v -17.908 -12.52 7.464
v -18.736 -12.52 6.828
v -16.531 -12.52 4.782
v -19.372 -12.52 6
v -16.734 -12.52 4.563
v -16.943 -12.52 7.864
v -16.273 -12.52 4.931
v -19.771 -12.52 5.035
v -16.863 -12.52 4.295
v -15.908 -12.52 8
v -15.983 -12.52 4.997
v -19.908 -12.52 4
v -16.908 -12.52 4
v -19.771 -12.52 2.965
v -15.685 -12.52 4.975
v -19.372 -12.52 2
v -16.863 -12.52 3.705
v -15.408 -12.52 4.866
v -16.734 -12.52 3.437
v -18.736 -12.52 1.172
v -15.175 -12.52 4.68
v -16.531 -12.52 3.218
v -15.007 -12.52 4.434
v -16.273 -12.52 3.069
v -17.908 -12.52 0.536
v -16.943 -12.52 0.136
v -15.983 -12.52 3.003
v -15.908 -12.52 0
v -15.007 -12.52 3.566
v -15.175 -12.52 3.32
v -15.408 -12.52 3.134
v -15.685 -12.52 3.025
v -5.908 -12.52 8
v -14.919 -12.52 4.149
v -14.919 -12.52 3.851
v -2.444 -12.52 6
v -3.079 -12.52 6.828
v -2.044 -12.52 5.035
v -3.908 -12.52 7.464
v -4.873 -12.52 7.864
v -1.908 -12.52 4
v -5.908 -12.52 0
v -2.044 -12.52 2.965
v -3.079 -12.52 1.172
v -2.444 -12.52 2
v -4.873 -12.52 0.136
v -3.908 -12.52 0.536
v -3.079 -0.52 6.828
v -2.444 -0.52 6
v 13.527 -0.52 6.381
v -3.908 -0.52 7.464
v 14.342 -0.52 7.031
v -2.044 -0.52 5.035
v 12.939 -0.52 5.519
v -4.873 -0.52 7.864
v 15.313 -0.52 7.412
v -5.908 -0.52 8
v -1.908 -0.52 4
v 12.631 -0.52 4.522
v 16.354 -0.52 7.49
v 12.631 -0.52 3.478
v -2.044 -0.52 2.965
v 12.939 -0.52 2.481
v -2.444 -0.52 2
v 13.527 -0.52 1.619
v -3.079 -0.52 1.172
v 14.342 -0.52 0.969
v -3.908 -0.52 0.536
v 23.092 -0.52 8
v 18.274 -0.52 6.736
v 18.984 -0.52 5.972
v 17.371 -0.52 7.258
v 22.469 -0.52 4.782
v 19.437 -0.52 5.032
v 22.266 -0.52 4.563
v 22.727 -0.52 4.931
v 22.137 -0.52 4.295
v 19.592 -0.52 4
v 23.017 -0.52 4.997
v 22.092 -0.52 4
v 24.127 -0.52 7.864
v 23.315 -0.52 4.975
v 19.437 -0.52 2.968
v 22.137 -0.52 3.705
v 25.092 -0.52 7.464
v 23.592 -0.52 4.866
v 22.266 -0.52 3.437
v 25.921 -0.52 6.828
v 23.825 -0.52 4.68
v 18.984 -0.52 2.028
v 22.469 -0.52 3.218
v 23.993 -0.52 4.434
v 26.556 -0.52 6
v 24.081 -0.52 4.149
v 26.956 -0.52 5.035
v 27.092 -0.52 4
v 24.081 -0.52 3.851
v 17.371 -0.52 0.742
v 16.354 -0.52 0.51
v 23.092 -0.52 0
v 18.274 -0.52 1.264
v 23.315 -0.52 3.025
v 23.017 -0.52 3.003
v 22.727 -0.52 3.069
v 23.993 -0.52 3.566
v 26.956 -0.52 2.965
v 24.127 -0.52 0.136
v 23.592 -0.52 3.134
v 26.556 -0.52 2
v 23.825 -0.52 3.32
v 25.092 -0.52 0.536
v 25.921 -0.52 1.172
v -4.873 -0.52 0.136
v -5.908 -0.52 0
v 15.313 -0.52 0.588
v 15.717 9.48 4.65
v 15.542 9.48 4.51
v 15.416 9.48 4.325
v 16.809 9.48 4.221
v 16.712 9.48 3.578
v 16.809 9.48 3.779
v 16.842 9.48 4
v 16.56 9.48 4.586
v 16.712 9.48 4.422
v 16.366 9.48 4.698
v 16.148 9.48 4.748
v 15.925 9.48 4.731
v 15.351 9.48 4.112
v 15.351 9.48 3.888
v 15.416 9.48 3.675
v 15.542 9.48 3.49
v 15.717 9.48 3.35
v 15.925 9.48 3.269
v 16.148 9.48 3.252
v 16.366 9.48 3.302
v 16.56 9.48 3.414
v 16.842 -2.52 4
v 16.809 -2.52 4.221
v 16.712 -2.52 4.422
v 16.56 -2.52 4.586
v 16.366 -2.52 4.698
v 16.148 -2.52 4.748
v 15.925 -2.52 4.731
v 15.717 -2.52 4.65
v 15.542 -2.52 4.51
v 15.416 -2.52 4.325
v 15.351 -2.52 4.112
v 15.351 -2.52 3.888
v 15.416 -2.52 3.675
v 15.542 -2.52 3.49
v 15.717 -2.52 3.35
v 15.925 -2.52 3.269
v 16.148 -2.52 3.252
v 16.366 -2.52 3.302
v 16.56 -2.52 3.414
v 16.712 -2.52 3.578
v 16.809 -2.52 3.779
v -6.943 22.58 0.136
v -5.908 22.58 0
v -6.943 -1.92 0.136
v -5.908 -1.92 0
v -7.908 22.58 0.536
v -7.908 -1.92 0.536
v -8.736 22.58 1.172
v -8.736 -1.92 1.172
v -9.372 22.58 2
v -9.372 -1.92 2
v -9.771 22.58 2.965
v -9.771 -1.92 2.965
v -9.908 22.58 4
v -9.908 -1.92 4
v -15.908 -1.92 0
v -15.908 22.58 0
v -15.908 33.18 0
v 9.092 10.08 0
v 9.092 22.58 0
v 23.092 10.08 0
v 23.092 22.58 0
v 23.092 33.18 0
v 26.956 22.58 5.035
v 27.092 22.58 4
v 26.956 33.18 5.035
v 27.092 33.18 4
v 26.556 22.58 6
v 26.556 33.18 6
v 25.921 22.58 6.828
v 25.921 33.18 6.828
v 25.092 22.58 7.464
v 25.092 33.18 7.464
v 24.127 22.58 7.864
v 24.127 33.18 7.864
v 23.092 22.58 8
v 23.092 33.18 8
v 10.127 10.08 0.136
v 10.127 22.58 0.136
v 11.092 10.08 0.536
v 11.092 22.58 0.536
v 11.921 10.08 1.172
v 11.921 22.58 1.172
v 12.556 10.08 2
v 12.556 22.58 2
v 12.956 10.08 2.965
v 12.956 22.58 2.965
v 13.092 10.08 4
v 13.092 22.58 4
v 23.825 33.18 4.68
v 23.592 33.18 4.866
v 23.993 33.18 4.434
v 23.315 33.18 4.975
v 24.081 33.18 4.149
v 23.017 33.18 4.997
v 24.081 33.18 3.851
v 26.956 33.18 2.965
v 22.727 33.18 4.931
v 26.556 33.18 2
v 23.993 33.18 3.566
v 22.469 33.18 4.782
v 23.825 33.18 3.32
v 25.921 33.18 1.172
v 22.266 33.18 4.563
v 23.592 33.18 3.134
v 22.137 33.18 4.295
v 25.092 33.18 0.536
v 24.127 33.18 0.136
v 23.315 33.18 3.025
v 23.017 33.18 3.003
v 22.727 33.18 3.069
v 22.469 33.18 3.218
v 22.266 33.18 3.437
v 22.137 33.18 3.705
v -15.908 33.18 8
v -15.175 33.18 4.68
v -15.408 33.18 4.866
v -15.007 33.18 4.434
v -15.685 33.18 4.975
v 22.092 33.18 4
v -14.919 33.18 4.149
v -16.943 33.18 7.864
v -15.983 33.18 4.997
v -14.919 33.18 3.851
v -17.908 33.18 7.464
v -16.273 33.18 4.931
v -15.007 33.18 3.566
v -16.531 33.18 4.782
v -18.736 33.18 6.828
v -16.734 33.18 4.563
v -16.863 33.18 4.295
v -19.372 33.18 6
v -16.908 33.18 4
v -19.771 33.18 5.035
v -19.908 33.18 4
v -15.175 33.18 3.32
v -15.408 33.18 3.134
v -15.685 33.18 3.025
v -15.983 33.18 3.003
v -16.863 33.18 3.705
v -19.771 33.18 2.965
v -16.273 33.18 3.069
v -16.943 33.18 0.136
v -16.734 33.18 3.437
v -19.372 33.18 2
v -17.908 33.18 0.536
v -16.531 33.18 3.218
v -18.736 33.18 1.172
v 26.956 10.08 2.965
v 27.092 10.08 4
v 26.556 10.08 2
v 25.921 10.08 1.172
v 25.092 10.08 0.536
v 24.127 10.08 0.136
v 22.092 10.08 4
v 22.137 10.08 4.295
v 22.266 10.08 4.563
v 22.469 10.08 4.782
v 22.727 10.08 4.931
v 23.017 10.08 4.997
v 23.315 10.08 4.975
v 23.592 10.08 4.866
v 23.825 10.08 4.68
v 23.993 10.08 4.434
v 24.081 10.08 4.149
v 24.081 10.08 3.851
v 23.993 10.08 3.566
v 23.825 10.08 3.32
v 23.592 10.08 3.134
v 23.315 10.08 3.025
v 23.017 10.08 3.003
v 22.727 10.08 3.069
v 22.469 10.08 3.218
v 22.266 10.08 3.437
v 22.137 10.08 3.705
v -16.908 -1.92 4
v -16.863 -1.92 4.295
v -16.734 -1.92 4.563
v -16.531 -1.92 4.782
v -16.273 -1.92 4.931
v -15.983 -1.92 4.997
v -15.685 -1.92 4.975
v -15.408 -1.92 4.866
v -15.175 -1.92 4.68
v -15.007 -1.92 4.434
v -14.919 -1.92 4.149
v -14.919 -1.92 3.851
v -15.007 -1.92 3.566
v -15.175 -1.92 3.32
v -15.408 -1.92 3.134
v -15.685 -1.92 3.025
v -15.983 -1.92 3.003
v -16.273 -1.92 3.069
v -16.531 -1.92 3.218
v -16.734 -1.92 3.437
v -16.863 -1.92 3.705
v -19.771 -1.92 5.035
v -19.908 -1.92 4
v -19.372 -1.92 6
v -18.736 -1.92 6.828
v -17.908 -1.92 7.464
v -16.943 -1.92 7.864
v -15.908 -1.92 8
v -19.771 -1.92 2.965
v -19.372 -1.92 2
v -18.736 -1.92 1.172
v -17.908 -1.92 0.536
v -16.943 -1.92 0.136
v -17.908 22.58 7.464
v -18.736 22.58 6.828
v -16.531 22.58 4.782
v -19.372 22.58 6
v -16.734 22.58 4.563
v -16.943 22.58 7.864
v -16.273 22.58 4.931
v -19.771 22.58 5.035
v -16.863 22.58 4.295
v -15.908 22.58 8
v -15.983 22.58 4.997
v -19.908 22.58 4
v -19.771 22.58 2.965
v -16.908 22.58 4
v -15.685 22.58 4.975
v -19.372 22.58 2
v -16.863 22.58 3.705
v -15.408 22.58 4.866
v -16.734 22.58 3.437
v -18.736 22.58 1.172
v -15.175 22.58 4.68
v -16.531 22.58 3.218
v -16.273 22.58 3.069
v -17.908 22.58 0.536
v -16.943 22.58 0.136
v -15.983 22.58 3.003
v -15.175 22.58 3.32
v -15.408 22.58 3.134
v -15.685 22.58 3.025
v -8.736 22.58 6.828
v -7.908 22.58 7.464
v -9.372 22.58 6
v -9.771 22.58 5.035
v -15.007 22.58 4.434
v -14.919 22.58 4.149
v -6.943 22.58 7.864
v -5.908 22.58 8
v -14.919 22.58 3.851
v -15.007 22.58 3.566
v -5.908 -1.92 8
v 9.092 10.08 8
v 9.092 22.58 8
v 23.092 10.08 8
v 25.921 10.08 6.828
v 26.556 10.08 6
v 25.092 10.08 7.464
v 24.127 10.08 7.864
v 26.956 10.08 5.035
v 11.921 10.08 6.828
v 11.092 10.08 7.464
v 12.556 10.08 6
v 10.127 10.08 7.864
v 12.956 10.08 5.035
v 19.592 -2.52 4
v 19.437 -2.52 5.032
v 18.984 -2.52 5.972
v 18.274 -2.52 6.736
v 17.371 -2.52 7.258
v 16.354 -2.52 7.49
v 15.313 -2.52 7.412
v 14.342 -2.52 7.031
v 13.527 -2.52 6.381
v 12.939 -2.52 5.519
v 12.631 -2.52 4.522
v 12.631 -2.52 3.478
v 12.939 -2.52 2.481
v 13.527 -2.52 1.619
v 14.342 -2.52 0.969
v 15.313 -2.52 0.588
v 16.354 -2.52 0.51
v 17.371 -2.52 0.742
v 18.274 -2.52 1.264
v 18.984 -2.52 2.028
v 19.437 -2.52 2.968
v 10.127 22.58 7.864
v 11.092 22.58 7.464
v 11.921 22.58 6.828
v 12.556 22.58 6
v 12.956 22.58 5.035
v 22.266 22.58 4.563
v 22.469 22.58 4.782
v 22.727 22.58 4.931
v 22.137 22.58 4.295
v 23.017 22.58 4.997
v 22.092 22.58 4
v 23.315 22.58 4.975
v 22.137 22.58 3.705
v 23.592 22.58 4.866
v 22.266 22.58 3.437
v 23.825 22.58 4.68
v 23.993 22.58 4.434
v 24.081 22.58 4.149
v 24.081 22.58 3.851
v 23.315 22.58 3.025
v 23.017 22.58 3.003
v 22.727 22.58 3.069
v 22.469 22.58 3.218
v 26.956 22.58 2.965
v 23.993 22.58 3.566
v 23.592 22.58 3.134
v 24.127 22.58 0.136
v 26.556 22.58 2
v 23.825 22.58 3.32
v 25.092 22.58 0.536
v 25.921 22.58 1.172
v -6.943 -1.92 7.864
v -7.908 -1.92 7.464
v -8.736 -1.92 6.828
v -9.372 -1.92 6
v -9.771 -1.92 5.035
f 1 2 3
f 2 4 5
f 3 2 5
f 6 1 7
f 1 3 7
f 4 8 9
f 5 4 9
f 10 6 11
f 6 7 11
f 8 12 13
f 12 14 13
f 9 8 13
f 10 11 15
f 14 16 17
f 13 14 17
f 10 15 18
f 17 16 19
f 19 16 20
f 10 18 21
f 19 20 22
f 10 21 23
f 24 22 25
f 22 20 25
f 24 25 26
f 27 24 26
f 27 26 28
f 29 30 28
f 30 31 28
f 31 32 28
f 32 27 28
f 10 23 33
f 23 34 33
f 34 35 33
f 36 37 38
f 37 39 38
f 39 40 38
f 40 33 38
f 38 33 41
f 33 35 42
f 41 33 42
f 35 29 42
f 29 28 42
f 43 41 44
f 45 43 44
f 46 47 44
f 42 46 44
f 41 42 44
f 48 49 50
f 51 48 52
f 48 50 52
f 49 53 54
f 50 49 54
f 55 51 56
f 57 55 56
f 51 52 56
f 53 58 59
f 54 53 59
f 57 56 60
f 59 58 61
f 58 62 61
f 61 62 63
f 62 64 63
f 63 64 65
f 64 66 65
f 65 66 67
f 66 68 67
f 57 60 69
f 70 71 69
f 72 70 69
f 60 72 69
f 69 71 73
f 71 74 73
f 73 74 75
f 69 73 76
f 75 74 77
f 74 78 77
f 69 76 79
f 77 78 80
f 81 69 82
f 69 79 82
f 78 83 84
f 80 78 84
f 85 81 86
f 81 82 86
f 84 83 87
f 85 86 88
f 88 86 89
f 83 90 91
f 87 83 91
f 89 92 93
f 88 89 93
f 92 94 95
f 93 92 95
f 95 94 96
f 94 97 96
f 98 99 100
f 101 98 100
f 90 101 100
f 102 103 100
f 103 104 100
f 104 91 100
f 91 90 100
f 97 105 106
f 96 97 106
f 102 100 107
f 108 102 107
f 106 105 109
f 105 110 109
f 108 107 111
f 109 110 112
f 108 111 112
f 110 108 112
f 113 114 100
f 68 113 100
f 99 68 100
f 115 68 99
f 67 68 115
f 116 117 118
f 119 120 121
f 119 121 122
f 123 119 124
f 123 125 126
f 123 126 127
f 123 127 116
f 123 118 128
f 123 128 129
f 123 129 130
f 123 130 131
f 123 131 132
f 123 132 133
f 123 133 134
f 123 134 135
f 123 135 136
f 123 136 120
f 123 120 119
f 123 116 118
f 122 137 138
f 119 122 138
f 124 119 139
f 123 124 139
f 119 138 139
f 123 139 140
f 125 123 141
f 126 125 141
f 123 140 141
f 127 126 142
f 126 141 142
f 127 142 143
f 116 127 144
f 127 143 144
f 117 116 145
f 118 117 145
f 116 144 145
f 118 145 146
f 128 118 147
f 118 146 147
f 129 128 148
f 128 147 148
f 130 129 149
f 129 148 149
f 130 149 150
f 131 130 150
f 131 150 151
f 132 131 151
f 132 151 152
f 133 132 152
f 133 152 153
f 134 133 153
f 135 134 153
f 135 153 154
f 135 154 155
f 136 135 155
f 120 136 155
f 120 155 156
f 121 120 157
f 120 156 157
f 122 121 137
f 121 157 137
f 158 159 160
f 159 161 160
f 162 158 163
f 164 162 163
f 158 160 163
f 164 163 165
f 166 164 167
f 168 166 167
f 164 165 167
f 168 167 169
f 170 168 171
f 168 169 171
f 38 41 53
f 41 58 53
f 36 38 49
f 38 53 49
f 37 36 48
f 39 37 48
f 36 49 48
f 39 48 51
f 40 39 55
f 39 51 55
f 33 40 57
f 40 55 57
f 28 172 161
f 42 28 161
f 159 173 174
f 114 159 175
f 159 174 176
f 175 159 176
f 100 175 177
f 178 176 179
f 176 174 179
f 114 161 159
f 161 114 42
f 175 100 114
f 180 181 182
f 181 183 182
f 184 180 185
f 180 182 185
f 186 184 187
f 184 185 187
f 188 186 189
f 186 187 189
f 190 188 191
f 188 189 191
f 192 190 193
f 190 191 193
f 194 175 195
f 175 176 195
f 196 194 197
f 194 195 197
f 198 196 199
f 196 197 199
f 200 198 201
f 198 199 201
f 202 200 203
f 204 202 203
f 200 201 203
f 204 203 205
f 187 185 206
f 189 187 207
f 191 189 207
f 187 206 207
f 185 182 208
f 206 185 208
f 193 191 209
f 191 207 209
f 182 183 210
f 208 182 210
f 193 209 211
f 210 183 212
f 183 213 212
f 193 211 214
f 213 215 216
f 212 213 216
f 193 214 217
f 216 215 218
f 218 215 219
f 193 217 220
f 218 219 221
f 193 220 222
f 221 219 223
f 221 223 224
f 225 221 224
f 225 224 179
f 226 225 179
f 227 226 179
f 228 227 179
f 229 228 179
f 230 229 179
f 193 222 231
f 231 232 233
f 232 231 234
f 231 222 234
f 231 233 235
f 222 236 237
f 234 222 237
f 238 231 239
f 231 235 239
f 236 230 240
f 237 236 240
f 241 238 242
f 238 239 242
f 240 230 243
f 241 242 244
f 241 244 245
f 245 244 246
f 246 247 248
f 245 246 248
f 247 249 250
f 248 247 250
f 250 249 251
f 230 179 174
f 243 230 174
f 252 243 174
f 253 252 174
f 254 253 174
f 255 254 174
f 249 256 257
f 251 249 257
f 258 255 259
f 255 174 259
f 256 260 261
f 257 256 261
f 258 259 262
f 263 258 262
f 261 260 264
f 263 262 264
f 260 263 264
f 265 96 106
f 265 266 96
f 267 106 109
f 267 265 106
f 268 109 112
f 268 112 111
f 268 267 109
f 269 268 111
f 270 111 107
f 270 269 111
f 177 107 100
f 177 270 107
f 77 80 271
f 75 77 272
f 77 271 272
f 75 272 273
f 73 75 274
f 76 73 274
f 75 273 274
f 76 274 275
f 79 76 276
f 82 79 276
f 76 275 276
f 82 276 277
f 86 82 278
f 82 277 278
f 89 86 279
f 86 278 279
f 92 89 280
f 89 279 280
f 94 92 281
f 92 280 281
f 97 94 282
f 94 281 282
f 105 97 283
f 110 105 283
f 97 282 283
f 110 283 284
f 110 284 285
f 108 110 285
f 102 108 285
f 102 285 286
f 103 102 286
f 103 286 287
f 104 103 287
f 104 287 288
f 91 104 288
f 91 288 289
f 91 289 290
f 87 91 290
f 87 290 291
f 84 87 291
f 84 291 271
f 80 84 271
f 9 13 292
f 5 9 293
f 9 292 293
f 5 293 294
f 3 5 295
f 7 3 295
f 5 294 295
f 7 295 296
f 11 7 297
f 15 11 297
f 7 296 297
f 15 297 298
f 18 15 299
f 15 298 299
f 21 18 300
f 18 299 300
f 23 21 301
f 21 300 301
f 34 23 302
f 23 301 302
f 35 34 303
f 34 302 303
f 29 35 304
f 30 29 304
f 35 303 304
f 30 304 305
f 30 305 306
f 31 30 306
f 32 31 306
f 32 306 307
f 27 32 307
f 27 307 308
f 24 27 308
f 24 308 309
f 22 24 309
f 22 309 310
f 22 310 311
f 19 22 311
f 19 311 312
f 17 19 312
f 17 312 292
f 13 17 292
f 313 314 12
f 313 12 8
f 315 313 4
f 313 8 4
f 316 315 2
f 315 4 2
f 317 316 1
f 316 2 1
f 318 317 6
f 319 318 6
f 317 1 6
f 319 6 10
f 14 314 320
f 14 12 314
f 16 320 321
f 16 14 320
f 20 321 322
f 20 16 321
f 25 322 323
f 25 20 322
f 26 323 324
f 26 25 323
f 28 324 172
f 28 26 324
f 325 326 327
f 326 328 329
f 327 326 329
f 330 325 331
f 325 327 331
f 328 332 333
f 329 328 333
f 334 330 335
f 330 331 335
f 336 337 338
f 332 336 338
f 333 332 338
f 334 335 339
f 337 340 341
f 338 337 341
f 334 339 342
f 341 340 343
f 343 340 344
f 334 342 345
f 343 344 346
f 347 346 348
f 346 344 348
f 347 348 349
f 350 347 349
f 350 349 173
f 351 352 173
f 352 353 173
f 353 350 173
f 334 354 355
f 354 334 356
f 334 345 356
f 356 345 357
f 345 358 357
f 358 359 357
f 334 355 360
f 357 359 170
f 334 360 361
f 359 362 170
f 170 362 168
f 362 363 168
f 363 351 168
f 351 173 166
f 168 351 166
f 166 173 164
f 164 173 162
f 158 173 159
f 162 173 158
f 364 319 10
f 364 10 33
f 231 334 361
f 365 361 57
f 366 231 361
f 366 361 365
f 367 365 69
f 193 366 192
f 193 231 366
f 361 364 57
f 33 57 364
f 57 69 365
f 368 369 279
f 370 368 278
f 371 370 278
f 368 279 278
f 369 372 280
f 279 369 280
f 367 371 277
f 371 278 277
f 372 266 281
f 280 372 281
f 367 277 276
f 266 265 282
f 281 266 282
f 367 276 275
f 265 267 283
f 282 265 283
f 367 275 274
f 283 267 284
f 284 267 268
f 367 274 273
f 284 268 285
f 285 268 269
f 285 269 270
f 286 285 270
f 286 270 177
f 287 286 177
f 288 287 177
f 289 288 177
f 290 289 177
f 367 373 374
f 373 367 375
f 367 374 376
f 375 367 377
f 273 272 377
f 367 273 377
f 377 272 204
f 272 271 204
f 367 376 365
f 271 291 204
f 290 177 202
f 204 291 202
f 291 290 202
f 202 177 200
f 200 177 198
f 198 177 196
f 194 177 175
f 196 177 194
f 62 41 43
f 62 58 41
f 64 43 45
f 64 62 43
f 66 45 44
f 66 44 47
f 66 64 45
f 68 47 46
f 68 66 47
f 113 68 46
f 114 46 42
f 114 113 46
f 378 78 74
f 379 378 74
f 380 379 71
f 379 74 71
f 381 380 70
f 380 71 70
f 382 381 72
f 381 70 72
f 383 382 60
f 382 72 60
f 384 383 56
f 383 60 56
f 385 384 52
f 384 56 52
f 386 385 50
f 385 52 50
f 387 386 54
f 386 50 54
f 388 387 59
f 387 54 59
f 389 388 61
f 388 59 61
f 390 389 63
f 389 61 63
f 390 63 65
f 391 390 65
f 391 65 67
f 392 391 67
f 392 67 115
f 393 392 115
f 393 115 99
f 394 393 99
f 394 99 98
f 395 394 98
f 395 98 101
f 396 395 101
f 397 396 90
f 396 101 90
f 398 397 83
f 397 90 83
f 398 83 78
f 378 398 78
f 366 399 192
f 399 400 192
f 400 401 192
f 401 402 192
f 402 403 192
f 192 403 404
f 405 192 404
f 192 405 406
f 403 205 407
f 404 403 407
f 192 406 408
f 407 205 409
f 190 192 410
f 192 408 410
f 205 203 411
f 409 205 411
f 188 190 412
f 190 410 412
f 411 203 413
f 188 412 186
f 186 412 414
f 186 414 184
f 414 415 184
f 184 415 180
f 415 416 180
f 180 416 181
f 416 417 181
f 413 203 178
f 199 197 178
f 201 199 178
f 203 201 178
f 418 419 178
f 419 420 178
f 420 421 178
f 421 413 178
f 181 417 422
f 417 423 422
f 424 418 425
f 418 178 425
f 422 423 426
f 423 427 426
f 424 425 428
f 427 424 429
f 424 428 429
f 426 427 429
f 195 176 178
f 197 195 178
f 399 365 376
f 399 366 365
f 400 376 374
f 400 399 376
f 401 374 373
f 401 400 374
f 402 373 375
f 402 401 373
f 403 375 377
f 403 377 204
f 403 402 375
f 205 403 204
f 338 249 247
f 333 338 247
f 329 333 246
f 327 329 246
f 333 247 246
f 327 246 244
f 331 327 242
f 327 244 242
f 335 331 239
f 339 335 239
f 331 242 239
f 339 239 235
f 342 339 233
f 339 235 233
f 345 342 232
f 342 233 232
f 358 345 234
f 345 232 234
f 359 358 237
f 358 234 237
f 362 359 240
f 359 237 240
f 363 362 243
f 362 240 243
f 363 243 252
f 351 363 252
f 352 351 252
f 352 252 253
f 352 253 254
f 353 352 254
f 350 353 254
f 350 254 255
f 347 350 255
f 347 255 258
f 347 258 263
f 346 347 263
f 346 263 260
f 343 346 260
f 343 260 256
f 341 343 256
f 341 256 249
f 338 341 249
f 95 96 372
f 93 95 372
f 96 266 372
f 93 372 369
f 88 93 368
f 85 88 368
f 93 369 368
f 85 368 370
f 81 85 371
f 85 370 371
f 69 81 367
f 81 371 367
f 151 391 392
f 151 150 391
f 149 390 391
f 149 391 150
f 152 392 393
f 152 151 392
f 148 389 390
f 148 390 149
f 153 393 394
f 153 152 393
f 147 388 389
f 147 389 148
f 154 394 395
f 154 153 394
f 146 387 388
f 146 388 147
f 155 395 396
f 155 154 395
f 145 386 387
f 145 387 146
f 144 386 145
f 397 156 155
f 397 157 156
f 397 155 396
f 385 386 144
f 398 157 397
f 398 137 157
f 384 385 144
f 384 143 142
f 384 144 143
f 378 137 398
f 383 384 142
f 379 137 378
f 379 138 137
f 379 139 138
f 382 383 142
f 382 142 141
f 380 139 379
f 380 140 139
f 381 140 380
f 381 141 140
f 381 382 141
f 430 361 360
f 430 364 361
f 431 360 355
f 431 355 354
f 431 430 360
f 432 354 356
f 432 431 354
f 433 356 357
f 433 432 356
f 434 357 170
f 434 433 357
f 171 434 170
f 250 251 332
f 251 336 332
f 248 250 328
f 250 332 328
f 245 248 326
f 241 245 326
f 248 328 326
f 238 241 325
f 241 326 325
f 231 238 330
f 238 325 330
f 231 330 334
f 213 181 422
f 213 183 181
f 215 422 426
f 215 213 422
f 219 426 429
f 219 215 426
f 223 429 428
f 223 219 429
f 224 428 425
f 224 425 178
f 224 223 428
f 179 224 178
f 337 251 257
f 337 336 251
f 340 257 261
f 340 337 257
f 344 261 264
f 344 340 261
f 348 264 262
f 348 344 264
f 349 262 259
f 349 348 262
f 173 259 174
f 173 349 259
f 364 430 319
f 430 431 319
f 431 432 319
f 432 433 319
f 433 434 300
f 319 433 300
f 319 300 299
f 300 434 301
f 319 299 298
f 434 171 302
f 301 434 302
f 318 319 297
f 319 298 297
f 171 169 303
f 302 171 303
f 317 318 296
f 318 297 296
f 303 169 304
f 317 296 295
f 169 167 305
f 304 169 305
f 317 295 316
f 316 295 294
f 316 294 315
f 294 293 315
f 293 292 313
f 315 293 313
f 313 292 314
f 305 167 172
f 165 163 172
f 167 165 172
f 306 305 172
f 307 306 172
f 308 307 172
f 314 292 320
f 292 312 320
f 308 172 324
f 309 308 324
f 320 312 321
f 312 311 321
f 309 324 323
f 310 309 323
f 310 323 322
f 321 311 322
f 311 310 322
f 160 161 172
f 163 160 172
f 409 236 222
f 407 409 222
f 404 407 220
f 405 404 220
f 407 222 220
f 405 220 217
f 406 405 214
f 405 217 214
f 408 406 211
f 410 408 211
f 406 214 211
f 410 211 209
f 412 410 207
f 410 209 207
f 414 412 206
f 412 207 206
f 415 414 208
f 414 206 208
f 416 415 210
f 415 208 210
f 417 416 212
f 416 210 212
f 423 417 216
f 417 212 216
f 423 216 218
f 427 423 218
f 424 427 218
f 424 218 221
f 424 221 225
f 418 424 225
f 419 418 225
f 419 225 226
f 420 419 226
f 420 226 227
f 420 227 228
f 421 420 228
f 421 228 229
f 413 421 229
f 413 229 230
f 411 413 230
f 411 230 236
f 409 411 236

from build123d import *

# Parameters (mm, degrees)
F1_DEPTH = 8
F2_R     = 3.99999
F3_R     = 1
F4_DEPTH = 60
F6_R     = 3.99999
F5_R     = 3.5
F7_DEPTH = 2
F8_R     = 0.75
F9_DEPTH = 12


# Not quite as in the source:
# - a fillet or chamfer is up to 0.001 mm smaller than in the source, because OpenCascade refuses the exact size


with BuildPart() as f1:
    # F0 (on Top) → F1 (new body)
    with BuildSketch(Plane.XY):
        Polygon((-19.9077894302, -1.920078908), (-19.9077894302, -12.520078908), (-1.9077894302, -12.520078908), (-1.9077894302, -0.520078908), (27.0922105698, -0.520078908), (27.0922105698, 10.079921092), (13.0922105698, 10.079921092), (13.0922105698, 22.579921092), (27.0922105698, 22.579921092), (27.0922105698, 33.179921092), (-19.9077894302, 33.179921092), (-19.9077894302, 22.579921092), (-9.9077894302, 22.579921092), (-9.9077894302, -1.920078908), align=None)
    extrude(amount=F1_DEPTH)

    # F2 (radius 4 in the source; OpenCascade refuses exactly that, so slightly less here)
    f2_edges = [f1.edges().sort_by_distance(p)[0] for p in [
        (-19.907789, -7.220079, 8),
        (-19.907789, -7.220079, 0),
        (-1.907789, -6.520079, 8),
        (-1.907789, -6.520079, 0),
        (27.092211, 4.779921, 8),
        (27.092211, 4.779921, 0),
        (27.092211, 27.879921, 8),
        (27.092211, 27.879921, 0),
        (-19.907789, 27.879921, 8),
        (-19.907789, 27.879921, 0),
    ]]
    fillet(f2_edges, radius=F2_R)

    # F3 (on face) → F4 (cut)
    with BuildSketch(Plane(origin=(0, 33.179921092, 0), x_dir=(-1, 0, 0), z_dir=(0, 1, 0))):
        with Locations((-23.0922105698, 4)):
            Circle(F3_R)
        with Locations((15.9077894302, 4)):
            Circle(F3_R)
    extrude(amount=-F4_DEPTH, mode=Mode.SUBTRACT)

    # F6 (radius 4 in the source; OpenCascade refuses exactly that, so slightly less here)
    f6_edges = [f1.edges().sort_by_distance(p)[0] for p in [
        (-9.907789, 10.329921, 8),
        (-9.907789, 10.329921, 0),
        (13.092211, 16.329921, 8),
        (13.092211, 16.329921, 0),
    ]]
    fillet(f6_edges, radius=F6_R)

    # F5 (on face) → F7 (join)
    with BuildSketch(Plane.XZ.offset(0.520078908)):
        with Locations((16.0922105698, 4)):
            Circle(F5_R)
    extrude(amount=F7_DEPTH)

    # F8 (on face) → F9 (cut)
    with BuildSketch(Plane.XZ.offset(2.520078908)):
        with Locations((16.0922105698, 4)):
            Circle(F8_R)
    extrude(amount=-F9_DEPTH, mode=Mode.SUBTRACT)


solid = f1.part
